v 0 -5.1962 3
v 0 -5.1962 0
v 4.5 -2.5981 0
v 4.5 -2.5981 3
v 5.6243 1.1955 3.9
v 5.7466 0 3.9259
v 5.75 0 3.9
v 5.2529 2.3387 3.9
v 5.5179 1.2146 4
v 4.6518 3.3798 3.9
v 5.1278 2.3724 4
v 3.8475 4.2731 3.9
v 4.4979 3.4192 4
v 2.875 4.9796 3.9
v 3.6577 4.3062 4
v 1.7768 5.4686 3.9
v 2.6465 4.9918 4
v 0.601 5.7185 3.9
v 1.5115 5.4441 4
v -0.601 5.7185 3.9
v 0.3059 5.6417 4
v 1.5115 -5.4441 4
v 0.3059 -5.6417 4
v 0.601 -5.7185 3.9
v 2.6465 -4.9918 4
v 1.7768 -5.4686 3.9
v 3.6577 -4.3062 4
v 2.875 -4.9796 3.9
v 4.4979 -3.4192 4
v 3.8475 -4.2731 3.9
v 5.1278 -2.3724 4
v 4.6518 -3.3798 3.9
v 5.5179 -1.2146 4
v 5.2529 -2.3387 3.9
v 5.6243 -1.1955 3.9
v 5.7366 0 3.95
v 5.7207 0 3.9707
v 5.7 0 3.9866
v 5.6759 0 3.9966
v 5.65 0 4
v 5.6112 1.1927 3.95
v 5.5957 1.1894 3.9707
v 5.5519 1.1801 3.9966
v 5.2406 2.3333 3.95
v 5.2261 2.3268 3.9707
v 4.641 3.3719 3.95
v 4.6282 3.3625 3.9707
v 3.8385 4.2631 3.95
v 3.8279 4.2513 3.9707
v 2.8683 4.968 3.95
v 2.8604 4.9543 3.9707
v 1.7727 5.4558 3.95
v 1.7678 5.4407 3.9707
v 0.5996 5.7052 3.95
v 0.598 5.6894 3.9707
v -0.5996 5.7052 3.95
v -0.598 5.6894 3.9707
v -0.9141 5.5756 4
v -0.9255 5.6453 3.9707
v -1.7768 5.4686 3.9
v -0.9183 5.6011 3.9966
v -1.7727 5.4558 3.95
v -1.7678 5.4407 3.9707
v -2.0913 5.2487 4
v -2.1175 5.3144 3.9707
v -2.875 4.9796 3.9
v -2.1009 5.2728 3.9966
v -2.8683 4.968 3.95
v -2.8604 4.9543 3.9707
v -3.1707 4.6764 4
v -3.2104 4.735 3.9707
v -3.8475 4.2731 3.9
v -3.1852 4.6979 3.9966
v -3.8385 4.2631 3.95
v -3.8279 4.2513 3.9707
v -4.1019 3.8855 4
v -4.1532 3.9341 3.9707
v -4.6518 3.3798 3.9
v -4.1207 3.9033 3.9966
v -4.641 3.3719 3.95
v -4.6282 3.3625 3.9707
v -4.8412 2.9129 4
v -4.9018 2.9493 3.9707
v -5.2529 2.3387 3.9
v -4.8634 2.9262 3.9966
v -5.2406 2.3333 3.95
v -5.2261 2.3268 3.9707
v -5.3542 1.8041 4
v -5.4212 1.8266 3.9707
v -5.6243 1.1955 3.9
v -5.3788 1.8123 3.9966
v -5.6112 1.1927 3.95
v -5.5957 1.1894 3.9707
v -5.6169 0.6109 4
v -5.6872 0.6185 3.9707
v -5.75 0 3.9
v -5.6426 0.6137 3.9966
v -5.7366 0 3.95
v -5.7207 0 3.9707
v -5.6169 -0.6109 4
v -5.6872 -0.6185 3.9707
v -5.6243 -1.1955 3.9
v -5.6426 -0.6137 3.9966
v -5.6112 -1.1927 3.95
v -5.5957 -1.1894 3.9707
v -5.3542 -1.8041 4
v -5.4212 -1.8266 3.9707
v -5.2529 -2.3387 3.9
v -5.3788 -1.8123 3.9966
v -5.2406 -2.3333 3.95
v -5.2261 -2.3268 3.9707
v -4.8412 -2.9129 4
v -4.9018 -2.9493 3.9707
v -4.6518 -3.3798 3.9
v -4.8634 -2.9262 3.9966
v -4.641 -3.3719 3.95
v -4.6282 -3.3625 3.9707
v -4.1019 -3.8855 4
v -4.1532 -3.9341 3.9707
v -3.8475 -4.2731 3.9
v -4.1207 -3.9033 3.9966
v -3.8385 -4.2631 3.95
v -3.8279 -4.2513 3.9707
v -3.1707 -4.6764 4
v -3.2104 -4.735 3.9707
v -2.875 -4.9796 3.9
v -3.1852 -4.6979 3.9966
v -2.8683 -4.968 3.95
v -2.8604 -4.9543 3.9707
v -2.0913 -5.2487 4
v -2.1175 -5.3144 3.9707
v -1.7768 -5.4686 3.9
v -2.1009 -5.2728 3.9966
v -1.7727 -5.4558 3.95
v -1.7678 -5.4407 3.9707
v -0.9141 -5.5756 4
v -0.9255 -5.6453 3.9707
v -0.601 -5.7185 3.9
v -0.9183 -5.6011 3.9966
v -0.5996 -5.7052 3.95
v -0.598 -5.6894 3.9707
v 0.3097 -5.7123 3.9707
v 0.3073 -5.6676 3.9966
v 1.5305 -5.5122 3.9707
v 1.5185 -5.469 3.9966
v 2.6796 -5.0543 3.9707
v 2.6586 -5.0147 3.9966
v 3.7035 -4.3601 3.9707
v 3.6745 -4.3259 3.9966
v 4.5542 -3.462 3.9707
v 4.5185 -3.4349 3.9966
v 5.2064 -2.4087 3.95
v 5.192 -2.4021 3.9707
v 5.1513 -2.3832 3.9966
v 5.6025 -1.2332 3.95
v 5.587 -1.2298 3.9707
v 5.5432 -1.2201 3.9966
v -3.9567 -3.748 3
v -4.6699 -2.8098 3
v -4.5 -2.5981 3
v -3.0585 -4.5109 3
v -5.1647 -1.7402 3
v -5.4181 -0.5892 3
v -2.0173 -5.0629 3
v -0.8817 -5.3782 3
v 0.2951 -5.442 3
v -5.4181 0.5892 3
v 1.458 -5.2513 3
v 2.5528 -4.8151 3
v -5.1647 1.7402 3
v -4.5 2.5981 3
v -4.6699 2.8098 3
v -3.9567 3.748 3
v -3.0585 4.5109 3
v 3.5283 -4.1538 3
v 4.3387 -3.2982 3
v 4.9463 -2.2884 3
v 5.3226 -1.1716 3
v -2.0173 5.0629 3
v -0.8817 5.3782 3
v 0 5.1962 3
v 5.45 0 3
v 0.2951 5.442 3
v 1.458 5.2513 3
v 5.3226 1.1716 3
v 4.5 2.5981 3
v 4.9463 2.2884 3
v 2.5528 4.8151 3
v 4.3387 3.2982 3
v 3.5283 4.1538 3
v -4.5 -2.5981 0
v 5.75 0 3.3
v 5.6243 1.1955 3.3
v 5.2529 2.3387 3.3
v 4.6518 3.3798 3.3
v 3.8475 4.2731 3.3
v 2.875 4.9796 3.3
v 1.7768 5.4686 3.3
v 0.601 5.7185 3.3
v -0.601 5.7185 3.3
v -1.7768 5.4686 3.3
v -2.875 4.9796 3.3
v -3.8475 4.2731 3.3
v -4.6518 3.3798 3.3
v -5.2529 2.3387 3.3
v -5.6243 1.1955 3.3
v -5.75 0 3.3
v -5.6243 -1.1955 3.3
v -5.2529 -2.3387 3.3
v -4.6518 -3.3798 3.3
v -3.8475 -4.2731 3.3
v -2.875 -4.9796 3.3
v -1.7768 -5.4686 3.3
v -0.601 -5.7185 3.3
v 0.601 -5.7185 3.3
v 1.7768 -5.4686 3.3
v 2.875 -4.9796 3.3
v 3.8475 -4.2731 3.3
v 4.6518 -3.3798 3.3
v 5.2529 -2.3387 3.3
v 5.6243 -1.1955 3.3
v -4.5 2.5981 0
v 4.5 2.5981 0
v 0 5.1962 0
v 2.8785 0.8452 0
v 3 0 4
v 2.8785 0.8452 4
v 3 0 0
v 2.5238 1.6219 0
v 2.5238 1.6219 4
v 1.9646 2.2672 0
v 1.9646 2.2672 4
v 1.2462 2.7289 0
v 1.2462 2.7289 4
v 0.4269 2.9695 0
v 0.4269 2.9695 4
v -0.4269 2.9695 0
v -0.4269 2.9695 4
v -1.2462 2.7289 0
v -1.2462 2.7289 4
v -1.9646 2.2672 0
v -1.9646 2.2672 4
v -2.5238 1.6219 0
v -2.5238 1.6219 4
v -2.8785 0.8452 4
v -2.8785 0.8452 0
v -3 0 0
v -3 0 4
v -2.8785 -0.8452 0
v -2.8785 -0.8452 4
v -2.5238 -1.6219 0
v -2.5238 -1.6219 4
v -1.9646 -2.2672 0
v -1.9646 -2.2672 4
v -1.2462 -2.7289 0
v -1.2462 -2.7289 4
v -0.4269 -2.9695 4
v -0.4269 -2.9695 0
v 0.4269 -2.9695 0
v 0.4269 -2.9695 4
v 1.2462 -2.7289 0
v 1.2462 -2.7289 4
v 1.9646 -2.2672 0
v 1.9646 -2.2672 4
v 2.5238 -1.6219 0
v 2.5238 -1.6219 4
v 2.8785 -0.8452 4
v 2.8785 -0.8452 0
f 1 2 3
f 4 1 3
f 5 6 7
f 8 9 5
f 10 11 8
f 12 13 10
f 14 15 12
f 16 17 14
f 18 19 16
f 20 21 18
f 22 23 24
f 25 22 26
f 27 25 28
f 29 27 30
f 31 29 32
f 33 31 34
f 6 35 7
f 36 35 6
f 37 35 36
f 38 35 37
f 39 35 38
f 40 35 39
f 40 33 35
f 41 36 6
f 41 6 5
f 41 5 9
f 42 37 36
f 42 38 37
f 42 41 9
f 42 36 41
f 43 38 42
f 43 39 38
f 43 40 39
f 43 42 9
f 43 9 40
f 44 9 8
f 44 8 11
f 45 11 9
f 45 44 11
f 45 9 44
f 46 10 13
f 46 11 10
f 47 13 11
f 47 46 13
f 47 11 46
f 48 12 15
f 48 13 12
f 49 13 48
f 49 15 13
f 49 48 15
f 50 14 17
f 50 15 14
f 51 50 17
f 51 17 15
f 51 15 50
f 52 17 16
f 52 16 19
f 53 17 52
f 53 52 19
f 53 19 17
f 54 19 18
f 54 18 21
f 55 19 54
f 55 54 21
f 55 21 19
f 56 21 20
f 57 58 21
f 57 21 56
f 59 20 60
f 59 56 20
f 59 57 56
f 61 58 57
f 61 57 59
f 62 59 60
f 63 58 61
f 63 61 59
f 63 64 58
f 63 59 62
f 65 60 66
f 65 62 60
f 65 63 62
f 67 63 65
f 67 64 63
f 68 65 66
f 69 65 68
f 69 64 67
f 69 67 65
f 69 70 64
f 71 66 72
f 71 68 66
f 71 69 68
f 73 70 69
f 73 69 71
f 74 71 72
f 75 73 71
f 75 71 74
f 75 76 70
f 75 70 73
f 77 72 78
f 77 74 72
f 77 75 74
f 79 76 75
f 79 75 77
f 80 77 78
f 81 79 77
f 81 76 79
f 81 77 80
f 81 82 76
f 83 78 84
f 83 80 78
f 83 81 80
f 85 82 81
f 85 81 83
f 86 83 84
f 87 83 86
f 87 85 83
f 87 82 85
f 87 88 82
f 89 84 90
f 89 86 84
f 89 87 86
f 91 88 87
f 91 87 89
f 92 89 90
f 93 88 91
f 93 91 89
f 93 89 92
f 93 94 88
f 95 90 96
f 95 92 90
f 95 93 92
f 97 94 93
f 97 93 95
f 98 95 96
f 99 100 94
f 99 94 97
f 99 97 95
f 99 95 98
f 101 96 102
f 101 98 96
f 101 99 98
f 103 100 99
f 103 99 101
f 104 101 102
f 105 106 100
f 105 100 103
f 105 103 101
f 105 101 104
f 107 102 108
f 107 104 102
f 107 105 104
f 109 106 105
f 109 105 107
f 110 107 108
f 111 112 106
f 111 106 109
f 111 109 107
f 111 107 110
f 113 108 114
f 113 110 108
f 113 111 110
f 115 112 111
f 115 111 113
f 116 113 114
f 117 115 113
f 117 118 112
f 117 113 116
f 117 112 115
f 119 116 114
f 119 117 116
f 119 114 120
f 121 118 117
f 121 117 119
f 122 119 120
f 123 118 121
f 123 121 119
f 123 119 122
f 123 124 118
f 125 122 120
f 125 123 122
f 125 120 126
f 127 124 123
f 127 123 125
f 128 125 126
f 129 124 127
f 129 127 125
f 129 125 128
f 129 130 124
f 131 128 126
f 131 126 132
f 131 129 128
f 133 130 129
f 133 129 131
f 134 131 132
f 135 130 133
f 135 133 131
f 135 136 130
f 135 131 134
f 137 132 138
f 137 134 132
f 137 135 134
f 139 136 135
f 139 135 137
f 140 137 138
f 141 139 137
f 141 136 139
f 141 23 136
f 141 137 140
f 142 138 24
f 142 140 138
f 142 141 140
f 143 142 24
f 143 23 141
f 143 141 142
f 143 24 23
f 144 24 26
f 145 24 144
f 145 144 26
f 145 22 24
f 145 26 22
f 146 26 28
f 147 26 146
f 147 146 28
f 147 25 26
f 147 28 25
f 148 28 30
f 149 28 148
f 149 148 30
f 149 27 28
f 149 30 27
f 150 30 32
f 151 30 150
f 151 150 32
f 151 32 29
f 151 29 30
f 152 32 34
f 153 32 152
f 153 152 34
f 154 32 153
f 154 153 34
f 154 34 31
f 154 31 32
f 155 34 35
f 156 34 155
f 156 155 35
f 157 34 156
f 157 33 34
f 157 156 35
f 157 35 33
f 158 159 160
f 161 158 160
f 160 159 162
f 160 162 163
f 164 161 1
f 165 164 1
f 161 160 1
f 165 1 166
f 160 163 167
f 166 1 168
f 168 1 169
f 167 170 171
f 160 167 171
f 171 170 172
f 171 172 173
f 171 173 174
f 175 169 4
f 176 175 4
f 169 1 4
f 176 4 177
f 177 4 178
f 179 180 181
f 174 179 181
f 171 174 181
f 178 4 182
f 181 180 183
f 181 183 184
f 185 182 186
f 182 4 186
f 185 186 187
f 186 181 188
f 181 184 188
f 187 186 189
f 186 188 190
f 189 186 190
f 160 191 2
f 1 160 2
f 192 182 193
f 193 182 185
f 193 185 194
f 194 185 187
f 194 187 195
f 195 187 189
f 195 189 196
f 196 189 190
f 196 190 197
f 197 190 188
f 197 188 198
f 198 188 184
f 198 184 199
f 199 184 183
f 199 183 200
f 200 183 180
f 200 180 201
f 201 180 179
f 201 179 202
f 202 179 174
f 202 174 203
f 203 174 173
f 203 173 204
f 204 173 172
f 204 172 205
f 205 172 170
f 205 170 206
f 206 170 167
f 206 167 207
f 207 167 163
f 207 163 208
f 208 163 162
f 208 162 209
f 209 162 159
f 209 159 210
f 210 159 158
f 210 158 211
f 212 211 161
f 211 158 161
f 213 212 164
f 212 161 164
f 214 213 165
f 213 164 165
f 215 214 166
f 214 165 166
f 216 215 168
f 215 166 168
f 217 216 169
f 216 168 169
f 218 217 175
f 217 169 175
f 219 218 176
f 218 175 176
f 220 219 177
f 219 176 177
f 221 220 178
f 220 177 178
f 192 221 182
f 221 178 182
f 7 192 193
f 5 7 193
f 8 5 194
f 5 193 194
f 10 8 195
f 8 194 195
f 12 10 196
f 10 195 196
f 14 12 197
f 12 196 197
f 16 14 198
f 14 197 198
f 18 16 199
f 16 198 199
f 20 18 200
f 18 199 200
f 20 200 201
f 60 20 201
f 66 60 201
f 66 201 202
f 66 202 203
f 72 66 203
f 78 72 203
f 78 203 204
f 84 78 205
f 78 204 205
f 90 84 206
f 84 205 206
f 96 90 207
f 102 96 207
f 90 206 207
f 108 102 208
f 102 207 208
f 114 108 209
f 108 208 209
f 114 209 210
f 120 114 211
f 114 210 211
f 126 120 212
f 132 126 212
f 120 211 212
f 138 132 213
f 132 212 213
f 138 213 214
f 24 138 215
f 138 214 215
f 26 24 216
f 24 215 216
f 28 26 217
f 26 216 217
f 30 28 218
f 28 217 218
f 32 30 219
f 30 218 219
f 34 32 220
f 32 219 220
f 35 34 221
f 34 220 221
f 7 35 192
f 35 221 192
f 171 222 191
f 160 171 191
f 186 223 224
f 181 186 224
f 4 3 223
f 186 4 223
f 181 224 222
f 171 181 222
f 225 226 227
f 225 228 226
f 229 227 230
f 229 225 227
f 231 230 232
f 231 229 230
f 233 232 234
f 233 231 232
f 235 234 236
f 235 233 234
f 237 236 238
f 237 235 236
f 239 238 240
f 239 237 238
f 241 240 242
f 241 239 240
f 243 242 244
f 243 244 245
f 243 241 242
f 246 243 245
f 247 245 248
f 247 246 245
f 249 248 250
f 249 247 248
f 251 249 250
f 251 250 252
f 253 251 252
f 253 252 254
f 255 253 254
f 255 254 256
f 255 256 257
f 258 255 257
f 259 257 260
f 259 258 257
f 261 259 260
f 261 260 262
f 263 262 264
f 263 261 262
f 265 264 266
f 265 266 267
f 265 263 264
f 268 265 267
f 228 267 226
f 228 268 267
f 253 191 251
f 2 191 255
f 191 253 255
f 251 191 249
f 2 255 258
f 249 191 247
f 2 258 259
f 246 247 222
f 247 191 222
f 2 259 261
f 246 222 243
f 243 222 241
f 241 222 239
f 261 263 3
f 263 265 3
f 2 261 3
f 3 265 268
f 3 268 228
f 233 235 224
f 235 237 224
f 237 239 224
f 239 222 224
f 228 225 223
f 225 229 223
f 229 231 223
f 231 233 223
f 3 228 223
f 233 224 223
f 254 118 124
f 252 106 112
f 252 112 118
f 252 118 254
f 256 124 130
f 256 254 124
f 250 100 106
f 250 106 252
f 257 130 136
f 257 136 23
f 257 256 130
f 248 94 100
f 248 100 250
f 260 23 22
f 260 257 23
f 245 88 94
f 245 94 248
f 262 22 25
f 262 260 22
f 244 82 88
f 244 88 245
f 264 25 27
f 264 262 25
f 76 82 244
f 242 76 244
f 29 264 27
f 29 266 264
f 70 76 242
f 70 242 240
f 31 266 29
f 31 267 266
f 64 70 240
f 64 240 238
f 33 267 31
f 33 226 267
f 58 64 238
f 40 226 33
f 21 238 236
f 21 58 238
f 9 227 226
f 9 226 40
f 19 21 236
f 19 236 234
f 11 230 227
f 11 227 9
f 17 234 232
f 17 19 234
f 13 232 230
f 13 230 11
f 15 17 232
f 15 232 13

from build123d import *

# Parameters (mm, degrees)
F0_R     = 3
F1_DEPTH = 3
F2_R     = 5.75
F2_R_2   = 3
F3_DEPTH = 1
F4_SIZE  = 0.3
F5_R     = 0.1


with BuildPart() as f1:
    # F0 (on Top) → F1 (new body)
    with BuildSketch(Plane.XY):
        Polygon((4.5, -2.598076), (4.5, 2.598076), (0, 5.196152), (-4.5, 2.598076), (-4.5, -2.598076), (0, -5.196152), align=None)
        Circle(F0_R, mode=Mode.SUBTRACT)
    extrude(amount=F1_DEPTH)

    # F2 (on face) → F3 (join)
    with BuildSketch(Plane.XY.offset(3)):
        Circle(F2_R)
        Circle(F2_R_2, mode=Mode.SUBTRACT)
    extrude(amount=F3_DEPTH)

    # F4
    f4_edges = [f1.edges().sort_by_distance(p)[0] for p in [
        (-5.75, 0, 3),
    ]]
    chamfer(f4_edges, length=F4_SIZE)

    # F5
    f5_edges = [f1.edges().sort_by_distance(p)[0] for p in [
        (-5.75, 0, 4),
    ]]
    fillet(f5_edges, radius=F5_R)


solid = f1.part
